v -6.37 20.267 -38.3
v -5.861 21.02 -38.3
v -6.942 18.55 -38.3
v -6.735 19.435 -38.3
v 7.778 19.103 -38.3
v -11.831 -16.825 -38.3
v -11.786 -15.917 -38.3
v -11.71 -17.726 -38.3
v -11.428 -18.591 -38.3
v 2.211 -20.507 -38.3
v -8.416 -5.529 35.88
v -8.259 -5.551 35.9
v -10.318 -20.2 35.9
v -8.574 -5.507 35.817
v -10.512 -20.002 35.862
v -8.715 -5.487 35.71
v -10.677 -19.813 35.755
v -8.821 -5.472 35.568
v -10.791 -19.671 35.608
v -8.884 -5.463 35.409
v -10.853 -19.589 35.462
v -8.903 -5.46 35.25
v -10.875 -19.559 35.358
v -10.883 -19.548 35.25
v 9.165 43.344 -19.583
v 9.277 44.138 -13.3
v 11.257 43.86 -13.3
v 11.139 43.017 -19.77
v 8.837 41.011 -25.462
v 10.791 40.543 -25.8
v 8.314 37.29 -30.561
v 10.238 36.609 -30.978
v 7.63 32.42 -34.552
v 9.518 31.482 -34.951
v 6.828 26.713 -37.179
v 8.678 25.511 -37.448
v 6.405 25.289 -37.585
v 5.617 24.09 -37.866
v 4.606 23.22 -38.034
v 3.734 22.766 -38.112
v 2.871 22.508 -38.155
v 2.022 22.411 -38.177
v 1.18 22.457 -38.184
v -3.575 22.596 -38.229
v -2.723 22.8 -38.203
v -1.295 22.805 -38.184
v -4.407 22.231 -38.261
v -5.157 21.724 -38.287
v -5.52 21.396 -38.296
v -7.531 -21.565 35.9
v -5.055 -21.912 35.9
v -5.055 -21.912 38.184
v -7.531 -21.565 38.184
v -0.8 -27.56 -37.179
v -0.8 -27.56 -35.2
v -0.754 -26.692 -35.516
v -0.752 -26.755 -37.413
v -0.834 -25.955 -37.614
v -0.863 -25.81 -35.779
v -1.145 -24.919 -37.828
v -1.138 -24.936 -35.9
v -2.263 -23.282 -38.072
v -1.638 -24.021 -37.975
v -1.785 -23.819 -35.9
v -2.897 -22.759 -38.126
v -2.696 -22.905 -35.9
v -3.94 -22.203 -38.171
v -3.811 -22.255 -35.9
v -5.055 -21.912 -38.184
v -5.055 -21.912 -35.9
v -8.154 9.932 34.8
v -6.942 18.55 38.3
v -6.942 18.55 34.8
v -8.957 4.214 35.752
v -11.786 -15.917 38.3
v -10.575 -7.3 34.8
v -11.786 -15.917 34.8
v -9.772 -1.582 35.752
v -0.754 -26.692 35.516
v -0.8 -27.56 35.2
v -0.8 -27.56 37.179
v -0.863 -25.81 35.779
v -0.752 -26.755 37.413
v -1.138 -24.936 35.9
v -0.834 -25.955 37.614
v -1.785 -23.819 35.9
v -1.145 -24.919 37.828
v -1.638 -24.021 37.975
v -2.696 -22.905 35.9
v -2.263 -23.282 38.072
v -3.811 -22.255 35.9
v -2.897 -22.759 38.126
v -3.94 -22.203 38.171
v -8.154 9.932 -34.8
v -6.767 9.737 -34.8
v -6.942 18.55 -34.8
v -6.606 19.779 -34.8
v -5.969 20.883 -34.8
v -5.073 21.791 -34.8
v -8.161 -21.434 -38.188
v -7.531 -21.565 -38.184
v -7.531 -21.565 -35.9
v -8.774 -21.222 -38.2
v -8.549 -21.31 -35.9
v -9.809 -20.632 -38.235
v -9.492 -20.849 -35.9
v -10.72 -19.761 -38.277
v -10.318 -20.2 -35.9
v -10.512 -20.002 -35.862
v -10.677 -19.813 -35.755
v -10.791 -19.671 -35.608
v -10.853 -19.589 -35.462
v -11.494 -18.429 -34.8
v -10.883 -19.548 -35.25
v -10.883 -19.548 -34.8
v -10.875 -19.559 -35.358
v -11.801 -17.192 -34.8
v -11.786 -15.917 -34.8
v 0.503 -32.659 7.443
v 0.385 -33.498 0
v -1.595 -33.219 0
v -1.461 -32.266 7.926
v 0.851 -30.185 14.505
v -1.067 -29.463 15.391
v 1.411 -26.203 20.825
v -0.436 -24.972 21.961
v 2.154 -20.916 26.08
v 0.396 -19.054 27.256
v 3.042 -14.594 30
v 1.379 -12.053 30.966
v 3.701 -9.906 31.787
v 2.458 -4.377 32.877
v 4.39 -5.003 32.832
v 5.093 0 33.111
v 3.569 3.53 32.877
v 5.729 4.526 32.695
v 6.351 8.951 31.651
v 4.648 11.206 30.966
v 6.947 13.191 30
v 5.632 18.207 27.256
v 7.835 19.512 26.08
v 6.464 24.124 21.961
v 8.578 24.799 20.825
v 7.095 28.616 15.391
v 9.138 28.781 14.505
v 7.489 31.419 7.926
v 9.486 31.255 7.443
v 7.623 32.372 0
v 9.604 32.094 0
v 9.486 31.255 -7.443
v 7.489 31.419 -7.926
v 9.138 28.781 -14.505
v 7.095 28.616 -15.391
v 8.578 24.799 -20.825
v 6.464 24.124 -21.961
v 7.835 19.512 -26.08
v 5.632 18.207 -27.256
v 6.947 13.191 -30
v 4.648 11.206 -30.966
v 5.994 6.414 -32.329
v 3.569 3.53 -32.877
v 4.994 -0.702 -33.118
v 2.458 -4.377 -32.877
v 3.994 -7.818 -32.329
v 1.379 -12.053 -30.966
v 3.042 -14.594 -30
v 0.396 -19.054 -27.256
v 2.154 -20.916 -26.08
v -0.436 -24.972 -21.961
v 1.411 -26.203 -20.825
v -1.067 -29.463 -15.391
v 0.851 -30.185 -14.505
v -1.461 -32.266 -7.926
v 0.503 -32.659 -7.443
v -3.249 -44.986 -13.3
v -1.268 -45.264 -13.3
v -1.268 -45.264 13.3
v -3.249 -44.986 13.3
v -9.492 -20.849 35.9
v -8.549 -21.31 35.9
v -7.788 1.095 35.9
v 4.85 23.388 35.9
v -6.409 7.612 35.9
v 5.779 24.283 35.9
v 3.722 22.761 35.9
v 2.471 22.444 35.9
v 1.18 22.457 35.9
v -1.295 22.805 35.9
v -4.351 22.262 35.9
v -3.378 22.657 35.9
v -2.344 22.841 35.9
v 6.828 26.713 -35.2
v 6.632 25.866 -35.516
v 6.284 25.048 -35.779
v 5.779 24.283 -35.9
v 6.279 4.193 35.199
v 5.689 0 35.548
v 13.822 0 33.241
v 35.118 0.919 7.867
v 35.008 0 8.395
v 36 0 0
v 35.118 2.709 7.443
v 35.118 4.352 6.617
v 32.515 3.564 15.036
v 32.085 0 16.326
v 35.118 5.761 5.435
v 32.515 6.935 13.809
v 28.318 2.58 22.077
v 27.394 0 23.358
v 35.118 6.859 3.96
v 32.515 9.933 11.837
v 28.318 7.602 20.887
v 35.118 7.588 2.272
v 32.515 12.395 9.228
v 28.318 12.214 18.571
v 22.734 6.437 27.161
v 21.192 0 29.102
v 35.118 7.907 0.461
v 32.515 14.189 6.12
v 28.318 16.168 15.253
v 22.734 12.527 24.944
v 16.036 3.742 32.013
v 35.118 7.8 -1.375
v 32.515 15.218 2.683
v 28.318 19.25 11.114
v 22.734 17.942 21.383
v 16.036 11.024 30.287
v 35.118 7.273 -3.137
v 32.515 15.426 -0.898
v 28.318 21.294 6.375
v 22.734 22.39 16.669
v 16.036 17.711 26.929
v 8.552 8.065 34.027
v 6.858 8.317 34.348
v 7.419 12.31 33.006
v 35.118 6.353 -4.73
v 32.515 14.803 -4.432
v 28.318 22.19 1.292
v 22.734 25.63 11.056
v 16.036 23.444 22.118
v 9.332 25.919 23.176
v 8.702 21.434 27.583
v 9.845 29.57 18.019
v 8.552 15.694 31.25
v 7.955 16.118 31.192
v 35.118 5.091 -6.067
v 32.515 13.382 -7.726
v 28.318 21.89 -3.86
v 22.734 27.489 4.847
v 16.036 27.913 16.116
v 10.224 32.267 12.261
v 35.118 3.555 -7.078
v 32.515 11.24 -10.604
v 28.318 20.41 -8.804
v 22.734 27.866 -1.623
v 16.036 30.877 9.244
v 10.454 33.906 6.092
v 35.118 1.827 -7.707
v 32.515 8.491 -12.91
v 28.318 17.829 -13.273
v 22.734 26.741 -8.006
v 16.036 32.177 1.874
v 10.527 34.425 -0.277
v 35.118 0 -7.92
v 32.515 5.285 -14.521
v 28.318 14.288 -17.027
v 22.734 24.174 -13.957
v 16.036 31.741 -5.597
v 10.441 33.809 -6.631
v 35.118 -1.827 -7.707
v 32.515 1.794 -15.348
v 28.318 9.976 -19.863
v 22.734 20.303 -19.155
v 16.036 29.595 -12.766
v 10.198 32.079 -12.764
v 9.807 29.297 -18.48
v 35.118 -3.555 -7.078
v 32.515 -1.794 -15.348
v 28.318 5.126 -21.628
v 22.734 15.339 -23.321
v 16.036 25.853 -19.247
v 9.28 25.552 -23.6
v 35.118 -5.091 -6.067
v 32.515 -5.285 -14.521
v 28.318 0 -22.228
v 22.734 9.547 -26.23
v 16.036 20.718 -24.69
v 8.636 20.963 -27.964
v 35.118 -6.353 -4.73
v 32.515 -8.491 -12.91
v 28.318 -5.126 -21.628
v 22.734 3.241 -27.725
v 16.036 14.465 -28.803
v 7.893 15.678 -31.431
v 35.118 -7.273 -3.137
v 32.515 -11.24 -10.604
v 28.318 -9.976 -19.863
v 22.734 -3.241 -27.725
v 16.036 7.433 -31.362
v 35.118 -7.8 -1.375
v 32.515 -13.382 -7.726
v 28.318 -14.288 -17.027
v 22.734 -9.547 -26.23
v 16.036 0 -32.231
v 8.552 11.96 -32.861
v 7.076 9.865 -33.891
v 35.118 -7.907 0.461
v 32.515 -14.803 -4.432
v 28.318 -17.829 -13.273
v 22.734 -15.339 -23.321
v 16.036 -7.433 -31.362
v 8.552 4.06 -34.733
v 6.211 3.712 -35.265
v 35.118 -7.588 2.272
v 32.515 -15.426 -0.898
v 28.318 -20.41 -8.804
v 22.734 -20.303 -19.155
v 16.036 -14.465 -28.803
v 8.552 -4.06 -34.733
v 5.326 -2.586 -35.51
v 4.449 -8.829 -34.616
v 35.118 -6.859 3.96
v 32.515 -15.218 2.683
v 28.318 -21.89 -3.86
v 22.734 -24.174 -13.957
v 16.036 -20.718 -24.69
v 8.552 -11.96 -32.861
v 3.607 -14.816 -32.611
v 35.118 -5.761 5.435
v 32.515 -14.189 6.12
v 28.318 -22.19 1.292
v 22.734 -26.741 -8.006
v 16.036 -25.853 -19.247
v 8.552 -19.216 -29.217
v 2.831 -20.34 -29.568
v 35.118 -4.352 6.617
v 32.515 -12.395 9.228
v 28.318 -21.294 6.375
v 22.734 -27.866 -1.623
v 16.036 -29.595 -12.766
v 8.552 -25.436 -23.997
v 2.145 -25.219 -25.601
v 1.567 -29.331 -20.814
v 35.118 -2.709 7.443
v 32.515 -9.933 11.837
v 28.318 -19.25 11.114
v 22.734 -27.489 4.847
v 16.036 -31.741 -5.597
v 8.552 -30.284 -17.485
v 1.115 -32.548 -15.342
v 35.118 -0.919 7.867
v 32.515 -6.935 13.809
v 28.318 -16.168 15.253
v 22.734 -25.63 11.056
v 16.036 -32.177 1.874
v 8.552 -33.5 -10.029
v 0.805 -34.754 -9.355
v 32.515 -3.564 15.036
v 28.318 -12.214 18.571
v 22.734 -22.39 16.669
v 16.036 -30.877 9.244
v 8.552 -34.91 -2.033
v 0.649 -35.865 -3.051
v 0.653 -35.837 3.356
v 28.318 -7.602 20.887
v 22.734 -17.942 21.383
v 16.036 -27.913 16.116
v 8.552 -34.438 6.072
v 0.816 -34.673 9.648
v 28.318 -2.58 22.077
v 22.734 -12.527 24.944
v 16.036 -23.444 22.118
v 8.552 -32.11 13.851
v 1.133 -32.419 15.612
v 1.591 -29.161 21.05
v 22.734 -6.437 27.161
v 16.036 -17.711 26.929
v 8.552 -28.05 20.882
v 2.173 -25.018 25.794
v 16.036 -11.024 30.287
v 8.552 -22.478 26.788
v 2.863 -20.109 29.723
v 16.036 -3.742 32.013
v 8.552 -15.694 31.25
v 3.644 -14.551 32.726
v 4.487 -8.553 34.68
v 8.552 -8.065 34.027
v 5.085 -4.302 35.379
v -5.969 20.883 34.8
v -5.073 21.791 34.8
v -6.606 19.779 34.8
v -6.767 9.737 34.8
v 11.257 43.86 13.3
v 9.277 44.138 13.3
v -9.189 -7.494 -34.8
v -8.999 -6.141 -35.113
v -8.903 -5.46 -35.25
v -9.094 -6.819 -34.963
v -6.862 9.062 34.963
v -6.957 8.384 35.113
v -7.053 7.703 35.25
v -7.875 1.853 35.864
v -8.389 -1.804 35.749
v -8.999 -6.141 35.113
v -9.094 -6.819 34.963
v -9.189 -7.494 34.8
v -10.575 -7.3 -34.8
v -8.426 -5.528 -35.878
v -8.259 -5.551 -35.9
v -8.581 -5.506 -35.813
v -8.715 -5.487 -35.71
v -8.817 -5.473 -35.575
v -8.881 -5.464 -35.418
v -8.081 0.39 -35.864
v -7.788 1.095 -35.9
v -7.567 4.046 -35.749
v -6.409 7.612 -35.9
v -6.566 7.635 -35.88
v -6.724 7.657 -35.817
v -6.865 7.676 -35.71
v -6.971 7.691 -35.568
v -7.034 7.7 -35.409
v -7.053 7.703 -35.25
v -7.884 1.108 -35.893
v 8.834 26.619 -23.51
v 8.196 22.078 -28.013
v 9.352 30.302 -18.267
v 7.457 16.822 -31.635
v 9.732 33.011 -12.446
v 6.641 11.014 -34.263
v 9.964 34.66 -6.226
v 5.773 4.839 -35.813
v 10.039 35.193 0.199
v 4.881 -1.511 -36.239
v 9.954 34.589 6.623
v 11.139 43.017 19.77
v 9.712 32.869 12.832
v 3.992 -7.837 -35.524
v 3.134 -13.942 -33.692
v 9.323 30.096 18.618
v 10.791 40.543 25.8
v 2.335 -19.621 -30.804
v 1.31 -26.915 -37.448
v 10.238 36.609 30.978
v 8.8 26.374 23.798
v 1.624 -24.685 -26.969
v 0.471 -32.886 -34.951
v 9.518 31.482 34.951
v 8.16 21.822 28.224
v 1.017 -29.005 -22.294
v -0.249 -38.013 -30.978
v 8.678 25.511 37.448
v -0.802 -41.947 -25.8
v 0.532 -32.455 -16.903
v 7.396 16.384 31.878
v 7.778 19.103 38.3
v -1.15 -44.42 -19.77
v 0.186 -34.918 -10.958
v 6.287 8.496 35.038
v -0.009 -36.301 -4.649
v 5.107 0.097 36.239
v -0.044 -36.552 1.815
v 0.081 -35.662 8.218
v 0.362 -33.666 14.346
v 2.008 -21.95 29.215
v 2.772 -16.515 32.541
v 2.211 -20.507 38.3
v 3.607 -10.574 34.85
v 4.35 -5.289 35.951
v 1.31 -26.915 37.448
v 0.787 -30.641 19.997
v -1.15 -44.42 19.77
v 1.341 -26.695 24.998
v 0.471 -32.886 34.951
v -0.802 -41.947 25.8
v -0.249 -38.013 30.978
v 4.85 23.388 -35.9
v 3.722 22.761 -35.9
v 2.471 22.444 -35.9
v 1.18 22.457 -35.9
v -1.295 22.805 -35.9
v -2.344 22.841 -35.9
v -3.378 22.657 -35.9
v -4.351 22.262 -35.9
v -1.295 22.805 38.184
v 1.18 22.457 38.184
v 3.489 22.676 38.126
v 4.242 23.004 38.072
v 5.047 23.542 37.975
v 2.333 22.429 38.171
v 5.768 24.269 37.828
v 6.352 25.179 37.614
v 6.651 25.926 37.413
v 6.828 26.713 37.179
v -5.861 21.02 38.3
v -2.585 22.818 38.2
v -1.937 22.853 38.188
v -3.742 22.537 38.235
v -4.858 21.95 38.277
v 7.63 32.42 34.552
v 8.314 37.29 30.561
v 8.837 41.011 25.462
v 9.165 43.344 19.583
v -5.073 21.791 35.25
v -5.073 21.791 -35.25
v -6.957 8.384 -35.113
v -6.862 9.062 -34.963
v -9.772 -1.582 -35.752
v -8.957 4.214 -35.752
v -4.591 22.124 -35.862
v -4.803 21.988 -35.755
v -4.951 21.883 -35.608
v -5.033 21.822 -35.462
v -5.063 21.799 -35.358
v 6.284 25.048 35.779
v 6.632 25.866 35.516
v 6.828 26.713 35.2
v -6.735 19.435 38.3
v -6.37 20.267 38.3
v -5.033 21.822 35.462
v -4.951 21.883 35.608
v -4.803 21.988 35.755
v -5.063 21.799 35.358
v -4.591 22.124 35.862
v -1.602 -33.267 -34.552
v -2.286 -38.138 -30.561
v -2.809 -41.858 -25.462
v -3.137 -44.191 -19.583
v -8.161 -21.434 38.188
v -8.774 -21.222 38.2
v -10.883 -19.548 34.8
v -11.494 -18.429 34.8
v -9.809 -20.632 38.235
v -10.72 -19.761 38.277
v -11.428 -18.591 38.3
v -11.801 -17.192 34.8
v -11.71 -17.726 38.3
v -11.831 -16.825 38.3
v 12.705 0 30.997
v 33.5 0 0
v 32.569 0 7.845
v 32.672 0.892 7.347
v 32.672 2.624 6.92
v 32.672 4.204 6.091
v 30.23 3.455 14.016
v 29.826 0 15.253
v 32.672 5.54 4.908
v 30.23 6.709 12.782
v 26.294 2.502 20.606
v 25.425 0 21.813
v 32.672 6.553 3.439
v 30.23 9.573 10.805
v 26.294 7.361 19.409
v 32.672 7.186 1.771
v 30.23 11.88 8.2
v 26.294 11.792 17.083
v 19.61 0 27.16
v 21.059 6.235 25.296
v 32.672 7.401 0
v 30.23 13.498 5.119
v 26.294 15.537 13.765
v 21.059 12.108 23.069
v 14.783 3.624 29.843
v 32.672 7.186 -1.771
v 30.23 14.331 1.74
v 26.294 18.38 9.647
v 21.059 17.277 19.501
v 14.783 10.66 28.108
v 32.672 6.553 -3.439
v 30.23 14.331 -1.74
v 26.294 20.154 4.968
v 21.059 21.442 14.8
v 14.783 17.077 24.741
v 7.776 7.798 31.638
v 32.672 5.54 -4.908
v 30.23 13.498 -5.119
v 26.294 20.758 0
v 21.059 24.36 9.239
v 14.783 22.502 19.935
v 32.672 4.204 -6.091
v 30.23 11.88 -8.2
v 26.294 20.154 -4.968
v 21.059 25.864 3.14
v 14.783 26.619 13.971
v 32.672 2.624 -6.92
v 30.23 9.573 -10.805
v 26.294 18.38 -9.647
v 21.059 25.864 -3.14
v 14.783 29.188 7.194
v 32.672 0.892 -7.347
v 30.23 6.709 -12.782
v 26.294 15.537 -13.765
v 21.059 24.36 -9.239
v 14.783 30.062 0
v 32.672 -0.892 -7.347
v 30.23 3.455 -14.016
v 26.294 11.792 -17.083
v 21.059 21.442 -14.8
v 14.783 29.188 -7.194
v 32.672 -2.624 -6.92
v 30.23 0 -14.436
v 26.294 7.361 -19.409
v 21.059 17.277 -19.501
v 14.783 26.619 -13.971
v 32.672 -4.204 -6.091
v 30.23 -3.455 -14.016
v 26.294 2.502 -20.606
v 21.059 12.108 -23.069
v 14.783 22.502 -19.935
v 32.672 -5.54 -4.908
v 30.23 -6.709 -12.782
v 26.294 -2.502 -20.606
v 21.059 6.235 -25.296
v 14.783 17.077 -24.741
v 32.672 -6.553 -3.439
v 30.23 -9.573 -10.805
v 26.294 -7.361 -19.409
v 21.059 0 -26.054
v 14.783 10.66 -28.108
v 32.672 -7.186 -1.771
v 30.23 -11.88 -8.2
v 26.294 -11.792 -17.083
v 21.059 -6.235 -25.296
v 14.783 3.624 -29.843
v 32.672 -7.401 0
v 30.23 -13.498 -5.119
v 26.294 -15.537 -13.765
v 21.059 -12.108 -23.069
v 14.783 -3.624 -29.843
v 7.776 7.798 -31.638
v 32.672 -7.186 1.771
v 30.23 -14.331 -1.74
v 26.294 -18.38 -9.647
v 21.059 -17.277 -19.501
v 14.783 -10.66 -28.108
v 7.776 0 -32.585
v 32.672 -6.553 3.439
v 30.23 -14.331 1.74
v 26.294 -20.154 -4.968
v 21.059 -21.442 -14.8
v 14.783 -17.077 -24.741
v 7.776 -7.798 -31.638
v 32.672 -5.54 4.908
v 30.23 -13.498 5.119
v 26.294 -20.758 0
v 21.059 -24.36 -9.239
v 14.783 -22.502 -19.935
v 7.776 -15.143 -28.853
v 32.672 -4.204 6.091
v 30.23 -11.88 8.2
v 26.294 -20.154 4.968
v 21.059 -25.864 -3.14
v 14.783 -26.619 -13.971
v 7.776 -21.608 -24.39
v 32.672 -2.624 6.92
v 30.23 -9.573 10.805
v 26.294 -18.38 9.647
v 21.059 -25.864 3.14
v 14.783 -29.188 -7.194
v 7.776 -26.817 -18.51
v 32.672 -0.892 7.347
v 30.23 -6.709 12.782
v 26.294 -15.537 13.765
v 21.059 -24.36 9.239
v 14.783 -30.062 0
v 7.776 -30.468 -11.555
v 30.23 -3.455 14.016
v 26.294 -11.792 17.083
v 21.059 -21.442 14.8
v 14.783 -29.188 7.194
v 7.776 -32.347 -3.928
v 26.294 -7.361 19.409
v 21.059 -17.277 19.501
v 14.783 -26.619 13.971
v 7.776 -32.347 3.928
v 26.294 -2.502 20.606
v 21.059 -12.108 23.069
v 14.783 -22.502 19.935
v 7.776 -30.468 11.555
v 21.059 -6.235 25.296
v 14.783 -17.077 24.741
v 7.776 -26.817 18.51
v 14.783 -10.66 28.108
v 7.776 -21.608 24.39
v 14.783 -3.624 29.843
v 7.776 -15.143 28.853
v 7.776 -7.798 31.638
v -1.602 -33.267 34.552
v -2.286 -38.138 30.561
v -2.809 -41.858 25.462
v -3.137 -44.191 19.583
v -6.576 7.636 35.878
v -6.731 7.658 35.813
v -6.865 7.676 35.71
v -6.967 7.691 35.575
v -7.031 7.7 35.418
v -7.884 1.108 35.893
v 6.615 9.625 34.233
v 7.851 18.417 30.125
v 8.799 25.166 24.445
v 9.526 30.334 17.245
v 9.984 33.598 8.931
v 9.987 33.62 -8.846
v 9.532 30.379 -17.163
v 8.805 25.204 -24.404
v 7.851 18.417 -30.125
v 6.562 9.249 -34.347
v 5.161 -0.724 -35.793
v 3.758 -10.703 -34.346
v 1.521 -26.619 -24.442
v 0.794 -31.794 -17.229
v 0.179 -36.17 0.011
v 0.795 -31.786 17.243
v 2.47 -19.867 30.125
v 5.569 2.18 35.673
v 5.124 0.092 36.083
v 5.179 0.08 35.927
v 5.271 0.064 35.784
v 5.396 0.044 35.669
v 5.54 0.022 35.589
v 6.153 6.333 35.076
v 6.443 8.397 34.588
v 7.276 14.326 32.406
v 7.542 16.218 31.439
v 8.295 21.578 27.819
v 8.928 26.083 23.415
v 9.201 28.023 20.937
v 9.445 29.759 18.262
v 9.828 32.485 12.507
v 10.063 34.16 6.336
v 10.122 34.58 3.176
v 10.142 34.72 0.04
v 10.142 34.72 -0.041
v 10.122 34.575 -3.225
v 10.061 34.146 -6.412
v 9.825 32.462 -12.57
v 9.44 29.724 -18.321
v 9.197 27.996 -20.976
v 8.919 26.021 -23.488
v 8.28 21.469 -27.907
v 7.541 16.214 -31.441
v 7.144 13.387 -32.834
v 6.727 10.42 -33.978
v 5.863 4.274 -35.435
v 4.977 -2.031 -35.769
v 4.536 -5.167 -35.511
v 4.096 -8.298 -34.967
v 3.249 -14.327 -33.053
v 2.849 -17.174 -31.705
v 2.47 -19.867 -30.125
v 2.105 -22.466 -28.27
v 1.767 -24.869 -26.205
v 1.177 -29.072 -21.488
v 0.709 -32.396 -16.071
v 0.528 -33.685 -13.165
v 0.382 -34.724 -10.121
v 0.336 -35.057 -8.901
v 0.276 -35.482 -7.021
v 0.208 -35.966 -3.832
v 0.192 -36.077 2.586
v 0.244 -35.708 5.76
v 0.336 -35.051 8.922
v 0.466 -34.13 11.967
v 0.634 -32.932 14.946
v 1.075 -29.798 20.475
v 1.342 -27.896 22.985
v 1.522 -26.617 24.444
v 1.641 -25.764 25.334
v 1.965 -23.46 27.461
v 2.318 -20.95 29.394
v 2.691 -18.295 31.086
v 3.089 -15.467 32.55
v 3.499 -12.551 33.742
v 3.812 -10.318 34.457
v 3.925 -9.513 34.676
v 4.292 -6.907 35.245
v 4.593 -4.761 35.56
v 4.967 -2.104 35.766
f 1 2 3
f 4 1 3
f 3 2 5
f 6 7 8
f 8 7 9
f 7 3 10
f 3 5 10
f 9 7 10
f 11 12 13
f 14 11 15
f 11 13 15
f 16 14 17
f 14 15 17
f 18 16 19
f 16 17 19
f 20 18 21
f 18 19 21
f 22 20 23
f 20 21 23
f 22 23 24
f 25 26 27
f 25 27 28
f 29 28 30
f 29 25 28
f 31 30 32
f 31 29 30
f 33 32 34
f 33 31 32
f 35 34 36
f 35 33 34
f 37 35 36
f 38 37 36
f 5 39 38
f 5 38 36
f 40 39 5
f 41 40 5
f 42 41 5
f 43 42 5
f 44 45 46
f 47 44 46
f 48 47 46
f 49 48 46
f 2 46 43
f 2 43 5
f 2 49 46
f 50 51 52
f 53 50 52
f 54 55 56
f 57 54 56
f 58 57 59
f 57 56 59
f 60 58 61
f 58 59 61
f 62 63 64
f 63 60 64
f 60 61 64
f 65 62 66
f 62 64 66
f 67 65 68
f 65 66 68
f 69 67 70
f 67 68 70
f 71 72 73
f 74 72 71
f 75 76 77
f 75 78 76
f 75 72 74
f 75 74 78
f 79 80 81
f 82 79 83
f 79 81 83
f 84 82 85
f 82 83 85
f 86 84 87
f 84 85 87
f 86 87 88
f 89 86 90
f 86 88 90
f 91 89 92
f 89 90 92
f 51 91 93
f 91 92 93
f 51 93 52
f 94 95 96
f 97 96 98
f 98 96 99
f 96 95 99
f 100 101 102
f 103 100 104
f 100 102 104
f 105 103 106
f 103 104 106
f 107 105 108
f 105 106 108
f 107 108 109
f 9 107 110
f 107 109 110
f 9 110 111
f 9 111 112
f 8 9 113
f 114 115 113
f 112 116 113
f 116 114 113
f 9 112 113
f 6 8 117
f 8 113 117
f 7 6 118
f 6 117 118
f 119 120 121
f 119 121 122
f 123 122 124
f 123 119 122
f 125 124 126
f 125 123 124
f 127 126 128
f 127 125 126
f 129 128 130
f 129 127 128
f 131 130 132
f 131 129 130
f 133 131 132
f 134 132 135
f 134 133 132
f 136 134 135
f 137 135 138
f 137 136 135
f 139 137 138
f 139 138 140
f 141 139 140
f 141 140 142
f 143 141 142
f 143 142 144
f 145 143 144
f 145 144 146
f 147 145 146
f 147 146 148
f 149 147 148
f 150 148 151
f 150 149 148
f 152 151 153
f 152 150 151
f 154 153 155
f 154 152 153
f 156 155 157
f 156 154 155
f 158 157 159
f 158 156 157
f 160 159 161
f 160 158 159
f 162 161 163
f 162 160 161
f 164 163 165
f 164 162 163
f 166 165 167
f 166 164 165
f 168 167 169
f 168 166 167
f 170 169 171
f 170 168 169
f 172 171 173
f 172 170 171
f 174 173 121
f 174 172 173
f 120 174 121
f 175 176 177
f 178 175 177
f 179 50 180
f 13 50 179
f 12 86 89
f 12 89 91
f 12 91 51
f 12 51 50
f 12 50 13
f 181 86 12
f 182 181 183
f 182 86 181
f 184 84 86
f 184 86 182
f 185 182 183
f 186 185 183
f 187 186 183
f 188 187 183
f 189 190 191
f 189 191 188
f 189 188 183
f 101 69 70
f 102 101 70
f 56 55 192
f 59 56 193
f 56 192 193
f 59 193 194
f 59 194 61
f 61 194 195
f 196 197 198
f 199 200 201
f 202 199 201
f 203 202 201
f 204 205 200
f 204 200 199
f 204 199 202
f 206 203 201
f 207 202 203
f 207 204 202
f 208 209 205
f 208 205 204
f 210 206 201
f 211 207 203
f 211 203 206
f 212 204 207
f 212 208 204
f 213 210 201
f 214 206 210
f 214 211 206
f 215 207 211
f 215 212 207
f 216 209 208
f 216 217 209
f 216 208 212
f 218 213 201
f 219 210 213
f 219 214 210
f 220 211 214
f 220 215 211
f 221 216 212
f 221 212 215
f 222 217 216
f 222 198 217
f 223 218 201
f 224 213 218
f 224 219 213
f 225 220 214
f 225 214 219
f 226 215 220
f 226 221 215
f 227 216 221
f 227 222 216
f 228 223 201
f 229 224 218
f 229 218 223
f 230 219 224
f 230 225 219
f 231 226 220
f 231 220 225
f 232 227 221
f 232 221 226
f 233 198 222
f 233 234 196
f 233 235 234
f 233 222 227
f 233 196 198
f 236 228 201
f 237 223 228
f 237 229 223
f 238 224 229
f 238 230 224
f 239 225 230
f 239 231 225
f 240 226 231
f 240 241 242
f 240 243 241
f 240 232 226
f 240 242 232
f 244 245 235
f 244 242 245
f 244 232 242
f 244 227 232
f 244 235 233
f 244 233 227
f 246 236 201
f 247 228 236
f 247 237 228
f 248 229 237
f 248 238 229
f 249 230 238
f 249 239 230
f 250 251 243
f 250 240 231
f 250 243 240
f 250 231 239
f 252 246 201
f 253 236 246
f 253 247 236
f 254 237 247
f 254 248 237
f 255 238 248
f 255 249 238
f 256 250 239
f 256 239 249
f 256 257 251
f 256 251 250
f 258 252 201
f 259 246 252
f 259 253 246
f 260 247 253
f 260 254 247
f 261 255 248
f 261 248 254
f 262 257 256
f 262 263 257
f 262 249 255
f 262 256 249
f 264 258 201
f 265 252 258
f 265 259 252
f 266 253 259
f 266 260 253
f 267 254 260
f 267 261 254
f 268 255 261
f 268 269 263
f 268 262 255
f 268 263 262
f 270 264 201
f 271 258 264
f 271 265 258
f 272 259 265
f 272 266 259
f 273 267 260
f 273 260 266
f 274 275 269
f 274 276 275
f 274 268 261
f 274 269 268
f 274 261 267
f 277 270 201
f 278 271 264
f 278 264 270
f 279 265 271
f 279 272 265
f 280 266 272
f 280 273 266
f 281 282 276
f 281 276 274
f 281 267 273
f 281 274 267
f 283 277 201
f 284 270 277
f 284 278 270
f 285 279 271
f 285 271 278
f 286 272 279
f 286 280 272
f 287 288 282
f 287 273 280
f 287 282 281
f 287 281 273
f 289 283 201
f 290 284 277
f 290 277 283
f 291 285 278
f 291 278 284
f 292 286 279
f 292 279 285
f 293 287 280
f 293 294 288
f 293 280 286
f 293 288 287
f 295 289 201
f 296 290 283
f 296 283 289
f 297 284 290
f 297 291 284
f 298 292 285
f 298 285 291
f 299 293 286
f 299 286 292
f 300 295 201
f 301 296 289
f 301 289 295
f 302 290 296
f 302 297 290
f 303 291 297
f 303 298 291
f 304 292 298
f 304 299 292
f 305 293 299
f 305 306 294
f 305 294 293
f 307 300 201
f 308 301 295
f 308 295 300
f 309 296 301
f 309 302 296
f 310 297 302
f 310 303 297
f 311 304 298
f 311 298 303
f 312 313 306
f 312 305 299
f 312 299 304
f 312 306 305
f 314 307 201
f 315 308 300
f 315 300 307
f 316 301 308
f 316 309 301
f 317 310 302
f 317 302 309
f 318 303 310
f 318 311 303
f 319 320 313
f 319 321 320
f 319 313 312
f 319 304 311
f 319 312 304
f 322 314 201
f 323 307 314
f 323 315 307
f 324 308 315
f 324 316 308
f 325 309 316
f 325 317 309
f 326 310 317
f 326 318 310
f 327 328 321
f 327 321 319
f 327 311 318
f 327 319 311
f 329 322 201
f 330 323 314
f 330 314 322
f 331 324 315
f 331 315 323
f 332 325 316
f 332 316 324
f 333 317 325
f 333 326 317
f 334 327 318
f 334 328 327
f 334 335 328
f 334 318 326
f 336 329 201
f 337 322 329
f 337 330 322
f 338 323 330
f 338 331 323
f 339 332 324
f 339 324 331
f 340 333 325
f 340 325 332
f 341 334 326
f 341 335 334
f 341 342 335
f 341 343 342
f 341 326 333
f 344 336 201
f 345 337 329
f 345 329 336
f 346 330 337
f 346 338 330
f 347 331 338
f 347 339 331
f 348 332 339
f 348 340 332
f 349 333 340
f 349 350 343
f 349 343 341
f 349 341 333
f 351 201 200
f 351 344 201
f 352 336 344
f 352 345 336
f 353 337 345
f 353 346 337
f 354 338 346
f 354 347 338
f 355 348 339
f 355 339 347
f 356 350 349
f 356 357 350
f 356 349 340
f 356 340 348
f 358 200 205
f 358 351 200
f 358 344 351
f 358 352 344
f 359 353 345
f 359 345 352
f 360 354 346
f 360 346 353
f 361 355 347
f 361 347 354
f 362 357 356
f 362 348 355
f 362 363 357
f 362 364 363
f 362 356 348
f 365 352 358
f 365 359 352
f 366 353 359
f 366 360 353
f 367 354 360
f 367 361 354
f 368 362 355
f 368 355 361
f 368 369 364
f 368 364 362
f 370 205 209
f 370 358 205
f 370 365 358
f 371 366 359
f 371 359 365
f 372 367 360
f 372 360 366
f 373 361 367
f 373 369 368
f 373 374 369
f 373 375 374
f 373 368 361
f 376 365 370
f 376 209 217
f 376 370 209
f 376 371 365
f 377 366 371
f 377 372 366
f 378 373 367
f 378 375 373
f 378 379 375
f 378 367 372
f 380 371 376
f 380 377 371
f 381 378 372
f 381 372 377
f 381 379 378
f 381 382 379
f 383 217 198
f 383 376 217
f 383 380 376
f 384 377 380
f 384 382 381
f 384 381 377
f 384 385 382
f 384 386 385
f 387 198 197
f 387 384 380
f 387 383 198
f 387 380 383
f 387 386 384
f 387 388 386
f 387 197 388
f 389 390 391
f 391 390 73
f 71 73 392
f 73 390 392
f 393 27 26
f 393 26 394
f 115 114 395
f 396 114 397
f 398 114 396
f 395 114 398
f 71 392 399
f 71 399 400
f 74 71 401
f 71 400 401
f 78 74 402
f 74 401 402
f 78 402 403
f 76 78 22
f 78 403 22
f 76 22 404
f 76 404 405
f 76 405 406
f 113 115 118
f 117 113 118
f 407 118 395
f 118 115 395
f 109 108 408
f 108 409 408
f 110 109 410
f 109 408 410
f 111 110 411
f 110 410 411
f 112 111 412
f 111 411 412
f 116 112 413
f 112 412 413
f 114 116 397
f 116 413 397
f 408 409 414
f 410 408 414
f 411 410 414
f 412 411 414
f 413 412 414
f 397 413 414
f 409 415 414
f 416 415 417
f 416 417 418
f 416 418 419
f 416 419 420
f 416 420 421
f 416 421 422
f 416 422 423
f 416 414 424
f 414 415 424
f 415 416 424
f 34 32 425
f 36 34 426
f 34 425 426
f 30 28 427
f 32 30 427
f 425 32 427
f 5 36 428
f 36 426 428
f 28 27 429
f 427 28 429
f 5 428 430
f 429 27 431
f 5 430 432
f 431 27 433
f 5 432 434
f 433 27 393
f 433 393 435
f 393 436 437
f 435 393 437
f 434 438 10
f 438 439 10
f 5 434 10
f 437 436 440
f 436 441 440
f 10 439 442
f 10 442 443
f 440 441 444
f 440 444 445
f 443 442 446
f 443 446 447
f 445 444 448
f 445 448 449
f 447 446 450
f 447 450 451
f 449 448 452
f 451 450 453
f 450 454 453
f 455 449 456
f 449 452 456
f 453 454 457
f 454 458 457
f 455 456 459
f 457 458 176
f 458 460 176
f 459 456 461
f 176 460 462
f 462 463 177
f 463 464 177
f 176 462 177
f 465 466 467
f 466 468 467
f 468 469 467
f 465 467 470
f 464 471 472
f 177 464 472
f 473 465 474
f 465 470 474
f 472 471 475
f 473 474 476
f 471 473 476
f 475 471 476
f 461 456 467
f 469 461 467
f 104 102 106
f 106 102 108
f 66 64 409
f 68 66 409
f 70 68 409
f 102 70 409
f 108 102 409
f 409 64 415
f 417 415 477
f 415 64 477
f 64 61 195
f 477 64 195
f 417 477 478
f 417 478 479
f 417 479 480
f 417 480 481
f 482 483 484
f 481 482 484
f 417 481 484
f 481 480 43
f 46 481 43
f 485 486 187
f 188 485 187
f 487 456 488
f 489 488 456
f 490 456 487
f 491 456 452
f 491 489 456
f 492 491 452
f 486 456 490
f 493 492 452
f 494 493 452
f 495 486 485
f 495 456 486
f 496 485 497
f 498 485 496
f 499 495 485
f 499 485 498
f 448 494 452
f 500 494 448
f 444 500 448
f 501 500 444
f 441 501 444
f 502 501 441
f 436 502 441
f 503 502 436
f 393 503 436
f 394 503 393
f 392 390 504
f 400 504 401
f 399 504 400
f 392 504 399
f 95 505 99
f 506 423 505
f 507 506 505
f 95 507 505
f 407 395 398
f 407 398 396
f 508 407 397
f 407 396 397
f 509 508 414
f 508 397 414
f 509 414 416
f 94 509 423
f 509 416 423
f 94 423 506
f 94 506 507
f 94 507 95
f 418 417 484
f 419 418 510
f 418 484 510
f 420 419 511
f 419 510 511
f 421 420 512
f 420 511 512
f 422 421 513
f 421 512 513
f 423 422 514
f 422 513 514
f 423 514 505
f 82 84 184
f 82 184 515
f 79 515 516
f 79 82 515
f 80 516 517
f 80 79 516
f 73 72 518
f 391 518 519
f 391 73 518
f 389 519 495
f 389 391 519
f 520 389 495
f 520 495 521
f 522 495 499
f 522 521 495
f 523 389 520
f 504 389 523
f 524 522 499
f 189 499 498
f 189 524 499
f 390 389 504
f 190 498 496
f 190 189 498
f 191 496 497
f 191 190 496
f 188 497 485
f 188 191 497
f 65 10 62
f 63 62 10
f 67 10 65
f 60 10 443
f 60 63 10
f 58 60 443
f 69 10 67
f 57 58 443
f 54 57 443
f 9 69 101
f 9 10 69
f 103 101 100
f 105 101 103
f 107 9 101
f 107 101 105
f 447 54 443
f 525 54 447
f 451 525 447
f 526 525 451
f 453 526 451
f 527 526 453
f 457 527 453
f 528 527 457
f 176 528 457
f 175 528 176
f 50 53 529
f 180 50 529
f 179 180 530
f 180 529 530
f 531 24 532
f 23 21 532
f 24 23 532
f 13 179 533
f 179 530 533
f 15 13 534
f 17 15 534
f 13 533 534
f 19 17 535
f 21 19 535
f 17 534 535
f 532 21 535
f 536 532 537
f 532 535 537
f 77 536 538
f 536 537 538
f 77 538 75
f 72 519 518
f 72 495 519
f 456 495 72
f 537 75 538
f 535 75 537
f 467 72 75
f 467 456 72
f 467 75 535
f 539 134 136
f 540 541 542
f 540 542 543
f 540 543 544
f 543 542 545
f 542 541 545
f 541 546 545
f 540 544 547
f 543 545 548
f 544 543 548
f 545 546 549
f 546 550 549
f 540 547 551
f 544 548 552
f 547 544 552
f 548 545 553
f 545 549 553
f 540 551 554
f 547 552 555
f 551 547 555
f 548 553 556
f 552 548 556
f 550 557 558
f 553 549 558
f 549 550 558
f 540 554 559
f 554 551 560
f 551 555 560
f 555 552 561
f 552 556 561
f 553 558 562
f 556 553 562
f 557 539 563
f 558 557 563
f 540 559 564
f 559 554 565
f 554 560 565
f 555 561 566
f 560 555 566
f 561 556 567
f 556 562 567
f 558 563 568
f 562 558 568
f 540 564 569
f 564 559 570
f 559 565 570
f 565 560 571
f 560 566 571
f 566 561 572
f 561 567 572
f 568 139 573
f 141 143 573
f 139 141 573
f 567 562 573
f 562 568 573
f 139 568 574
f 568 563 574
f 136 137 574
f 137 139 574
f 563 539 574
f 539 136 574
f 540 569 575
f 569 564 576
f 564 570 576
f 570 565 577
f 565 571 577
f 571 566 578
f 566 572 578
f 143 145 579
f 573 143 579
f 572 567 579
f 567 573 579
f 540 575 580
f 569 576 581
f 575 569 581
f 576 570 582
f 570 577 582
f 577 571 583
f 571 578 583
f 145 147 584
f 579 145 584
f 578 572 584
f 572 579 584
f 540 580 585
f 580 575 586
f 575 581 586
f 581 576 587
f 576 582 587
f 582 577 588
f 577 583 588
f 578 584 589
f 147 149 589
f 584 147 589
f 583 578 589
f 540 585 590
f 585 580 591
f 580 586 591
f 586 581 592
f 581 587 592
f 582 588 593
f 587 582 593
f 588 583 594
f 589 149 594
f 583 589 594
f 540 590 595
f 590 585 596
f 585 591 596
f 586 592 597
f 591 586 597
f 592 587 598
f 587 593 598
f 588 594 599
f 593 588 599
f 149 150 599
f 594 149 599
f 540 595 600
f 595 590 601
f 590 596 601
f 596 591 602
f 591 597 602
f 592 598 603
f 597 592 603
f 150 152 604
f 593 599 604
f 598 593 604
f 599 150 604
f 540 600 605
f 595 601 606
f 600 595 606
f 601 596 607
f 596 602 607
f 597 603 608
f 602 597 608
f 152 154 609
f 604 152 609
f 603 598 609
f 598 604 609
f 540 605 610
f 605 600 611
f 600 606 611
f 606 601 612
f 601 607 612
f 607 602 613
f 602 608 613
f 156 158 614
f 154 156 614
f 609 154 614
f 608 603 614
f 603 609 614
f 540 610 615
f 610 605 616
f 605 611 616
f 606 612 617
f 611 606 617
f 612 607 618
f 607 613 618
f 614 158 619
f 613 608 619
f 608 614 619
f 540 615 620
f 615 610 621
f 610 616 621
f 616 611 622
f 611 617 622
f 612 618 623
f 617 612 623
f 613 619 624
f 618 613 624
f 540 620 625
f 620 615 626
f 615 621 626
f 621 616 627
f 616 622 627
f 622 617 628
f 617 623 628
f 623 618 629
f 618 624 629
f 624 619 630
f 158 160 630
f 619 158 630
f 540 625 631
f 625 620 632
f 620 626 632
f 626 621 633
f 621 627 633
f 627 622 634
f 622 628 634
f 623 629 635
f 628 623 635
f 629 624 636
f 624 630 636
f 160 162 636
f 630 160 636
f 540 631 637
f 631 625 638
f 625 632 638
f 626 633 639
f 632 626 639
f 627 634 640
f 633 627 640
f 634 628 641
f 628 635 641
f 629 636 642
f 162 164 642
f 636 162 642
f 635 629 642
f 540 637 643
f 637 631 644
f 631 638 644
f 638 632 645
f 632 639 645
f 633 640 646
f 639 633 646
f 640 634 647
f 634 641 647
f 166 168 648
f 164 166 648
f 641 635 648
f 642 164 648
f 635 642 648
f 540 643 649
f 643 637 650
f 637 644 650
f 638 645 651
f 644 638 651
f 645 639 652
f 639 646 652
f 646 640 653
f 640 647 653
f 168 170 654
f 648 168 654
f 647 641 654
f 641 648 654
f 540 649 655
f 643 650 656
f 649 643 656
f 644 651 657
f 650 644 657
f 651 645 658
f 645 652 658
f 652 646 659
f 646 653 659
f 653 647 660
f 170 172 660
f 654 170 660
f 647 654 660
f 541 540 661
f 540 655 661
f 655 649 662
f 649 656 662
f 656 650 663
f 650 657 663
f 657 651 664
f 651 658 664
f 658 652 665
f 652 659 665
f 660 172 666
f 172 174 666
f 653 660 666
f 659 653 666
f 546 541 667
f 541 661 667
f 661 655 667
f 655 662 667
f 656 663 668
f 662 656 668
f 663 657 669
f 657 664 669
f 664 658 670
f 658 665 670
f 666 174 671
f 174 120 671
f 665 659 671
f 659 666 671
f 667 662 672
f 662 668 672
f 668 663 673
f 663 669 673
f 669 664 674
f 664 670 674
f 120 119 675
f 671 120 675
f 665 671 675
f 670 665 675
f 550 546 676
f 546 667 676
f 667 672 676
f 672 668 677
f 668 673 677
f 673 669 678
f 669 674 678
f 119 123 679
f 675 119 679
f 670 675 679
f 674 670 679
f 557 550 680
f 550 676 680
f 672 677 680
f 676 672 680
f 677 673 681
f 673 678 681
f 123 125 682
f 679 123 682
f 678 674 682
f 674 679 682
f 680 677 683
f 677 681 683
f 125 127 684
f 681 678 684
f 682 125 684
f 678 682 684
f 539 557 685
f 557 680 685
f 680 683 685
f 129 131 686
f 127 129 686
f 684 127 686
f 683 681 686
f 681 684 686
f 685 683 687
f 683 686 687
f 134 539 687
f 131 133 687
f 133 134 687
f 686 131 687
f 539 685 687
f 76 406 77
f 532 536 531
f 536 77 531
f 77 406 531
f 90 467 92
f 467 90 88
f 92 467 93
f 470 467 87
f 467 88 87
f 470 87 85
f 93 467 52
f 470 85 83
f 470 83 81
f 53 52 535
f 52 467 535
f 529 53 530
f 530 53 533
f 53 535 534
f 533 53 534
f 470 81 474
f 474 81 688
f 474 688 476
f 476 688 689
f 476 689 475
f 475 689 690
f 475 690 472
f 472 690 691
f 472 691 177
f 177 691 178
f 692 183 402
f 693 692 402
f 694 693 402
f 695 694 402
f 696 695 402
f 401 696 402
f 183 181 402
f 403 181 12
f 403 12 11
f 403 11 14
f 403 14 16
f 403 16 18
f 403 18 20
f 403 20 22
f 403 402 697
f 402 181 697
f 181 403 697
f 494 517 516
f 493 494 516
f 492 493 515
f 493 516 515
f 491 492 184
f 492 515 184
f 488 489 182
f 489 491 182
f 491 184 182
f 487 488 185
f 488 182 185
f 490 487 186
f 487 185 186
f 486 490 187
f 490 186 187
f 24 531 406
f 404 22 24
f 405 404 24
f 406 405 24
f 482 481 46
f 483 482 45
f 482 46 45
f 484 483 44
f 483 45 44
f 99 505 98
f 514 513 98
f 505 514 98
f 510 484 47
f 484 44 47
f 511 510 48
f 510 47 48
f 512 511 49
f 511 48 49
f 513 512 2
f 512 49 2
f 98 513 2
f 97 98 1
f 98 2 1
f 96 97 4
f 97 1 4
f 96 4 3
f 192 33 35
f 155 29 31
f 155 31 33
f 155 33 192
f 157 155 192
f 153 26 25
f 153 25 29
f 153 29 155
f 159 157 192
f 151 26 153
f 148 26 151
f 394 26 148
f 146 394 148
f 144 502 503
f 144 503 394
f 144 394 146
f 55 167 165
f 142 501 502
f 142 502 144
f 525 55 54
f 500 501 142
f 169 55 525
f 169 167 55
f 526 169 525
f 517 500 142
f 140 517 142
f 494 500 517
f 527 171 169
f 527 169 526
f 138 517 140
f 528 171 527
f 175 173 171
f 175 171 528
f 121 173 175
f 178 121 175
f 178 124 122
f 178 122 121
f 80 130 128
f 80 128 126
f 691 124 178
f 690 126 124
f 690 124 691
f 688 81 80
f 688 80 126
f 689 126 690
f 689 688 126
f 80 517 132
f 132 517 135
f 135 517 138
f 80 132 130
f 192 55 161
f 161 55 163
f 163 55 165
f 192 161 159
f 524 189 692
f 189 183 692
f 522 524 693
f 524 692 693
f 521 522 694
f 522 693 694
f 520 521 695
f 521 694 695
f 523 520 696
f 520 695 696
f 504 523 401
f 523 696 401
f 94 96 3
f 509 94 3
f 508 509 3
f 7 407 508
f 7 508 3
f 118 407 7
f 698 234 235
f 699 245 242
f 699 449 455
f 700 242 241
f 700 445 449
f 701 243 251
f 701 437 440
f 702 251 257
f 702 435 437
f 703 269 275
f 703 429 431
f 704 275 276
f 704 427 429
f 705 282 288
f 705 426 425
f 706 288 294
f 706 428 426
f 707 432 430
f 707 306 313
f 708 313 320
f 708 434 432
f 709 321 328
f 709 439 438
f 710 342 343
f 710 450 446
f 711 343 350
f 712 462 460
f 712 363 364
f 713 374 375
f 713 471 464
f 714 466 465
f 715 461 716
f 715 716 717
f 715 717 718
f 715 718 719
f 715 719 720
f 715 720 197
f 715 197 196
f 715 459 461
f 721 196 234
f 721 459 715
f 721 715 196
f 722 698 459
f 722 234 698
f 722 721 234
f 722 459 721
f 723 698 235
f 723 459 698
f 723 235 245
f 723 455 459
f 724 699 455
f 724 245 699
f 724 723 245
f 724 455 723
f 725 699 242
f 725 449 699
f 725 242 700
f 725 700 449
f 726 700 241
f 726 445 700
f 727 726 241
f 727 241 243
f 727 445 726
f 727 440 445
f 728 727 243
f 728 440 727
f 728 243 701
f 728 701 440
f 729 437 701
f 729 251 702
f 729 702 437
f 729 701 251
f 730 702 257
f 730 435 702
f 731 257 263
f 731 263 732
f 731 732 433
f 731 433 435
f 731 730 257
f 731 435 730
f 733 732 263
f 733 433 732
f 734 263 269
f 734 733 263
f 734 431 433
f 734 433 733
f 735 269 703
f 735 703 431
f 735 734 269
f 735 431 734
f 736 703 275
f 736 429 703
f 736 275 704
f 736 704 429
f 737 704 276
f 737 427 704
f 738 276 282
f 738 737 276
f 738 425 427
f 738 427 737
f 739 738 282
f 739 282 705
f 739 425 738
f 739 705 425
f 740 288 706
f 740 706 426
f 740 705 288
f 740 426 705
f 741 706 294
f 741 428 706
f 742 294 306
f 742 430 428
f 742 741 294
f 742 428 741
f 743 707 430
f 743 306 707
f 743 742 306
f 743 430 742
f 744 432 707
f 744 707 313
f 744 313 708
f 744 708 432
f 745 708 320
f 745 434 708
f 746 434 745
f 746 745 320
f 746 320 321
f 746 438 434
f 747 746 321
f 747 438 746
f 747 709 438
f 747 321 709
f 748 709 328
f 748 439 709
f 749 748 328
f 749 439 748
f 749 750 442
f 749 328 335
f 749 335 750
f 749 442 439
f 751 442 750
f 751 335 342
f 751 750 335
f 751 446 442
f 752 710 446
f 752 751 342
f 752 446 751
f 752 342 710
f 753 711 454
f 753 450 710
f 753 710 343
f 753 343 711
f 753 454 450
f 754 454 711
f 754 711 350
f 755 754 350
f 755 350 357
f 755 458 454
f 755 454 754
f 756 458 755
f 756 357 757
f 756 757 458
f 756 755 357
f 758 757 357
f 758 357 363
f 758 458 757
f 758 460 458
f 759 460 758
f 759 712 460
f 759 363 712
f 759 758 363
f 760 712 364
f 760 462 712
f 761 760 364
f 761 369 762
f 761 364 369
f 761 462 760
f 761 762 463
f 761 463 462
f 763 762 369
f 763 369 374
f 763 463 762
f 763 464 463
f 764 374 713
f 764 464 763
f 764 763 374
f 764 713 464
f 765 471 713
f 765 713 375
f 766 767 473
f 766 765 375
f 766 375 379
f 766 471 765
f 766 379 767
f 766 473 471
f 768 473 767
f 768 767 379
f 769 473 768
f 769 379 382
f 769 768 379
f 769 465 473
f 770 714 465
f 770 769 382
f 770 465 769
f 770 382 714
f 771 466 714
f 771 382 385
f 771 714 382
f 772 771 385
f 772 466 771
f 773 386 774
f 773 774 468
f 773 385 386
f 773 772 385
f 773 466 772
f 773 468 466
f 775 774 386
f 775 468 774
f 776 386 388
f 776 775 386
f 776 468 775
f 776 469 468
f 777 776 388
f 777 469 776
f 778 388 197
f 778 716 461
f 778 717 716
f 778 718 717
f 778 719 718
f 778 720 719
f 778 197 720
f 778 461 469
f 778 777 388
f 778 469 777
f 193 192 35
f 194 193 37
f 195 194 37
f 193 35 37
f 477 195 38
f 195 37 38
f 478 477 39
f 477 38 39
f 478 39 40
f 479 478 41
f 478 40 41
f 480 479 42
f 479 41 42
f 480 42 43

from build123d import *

# Parameters (mm, degrees)
F3_T      = -2.5
F4_DEPTH  = 30
F5_W      = 90
F5_H      = 76.6
F5_R      = 33.1181650608
F6_DEPTH  = 2
F8_DEPTH  = 12.5
F9_R      = 5
F10_R     = 25
F11_W     = 11.1
F11_H     = 71.8
F12_DEPTH = 50
F13_R     = 0.65
F14_R     = 0.7


with BuildPart() as f1:
    # F0 (on Front) → F1 (revolve)
    with BuildSketch(Plane.XZ):
        with BuildLine():
            Line((0, 0), (36, 0))
            ThreePointArc((36, 0), (25.4558441227, 25.4558441227), (0, 36))
            Line((0, 36), (0, 0))
        make_face()
    revolve(axis=Axis((-18.0951004178, 0, 0), (-1, 0, 0)))

    # F3
    f3_openings = [f1.faces().sort_by_distance(p)[0] for p in [
        (0, 0, 0),
    ]]
    offset(amount=F3_T, openings=f3_openings)

    # F2 (on Top) → F4 (cut, symmetric)
    with BuildSketch(Plane.XY):
        Polygon((0, 36.4718921483), (0, -36.2392216921), (10.2188806313, 36.4718921483), align=None)
    extrude(amount=F4_DEPTH, both=True, mode=Mode.SUBTRACT)

    # F5 (on face) → F6 (join)
    with BuildSketch(Plane(origin=(4.994441622, -0.7019229944, 0), x_dir=(-0.139173101, -0.9902680687, 0), z_dir=(-0.9902680687, 0.139173101, 0))):
        Rectangle(F5_W, F5_H)
        Circle(F5_R, mode=Mode.SUBTRACT)
    extrude(amount=F6_DEPTH)

    # F7 (on face) → F8 (join)
    with BuildSketch(Plane(origin=(3.0139054846, -0.4235767925, 0), x_dir=(-0.139173101, -0.9902680687, 0), z_dir=(-0.9902680687, 0.139173101, 0))):
        with BuildLine():
            Line((8.7003997857, 34.8), (22.4027797757, 34.8))
            Line((22.4027797757, 34.8), (22.4027797757, 38.3))
            Line((22.4027797757, 38.3), (-22.4027797757, 38.3))
            Line((-22.4027797757, 38.3), (-22.4027797757, 34.8))
            Line((-22.4027797757, 34.8), (-8.7003997857, 34.8))
            ThreePointArc((-8.7003997857, 34.8), (0, 35.8711159072), (8.7003997857, 34.8))
        make_face()
        with BuildLine():
            Line((-22.4027797757, -38.3), (22.4027797757, -38.3))
            Line((22.4027797757, -38.3), (22.4027797757, -34.8))
            Line((22.4027797757, -34.8), (8.7003997857, -34.8))
            ThreePointArc((8.7003997857, -34.8), (0, -35.8711159072), (-8.7003997857, -34.8))
            Line((-8.7003997857, -34.8), (-22.4027797757, -34.8))
            Line((-22.4027797757, -34.8), (-22.4027797757, -38.3))
        make_face()
    extrude(amount=F8_DEPTH)

    # F9
    f9_edges = [f1.edges().sort_by_distance(p)[0] for p in [
        (6.13177, 21.761181, 36.55),
        (-6.246581, 23.500844, 36.55),
        (-12.48231, -20.86867, 36.55),
        (-0.103959, -22.608334, 36.55),
        (-0.103959, -22.608334, -36.55),
        (-12.48231, -20.86867, -36.55),
        (-6.246581, 23.500844, -36.55),
        (6.13177, 21.761181, -36.55),
    ]]
    fillet(f9_edges, radius=F9_R)

    # F10
    f10_edges = [f1.edges().sort_by_distance(p)[0] for p in [
        (10.266963, 43.999313, 38.3),
        (10.266963, 43.999313, -38.3),
        (-2.258616, -45.124813, -38.3),
        (-2.258616, -45.124813, 38.3),
    ]]
    fillet(f10_edges, radius=F10_R)

    # F11 (on face) → F12 (cut, symmetric)
    with BuildSketch(Plane(origin=(3.1178643315, 22.184757463, 0), x_dir=(-0.9902680687, 0.139173101, 0), z_dir=(0.139173101, 0.9902680687, 0))):
        with Locations((2.5064751407, 0)):
            Rectangle(F11_W, F11_H)
    extrude(amount=F12_DEPTH, both=True, mode=Mode.SUBTRACT)

    # F13
    f13_edges = [f1.edges().sort_by_distance(p)[0] for p in [
        (-7.97807, 1.121245, 35.9),
        (-7.97807, 1.121245, -35.9),
    ]]
    fillet(f13_edges, radius=F13_R)

    # F14
    f14_edges = [f1.edges().sort_by_distance(p)[0] for p in [
        (27.196978, 0, 23.586529),
        (4.895793, -1.403846, -35.637907),
        (3.013905, -0.423577, -35.9),
        (3.013905, -0.423577, 35.9),
    ]]
    fillet(f14_edges, radius=F14_R)


solid = f1.part
